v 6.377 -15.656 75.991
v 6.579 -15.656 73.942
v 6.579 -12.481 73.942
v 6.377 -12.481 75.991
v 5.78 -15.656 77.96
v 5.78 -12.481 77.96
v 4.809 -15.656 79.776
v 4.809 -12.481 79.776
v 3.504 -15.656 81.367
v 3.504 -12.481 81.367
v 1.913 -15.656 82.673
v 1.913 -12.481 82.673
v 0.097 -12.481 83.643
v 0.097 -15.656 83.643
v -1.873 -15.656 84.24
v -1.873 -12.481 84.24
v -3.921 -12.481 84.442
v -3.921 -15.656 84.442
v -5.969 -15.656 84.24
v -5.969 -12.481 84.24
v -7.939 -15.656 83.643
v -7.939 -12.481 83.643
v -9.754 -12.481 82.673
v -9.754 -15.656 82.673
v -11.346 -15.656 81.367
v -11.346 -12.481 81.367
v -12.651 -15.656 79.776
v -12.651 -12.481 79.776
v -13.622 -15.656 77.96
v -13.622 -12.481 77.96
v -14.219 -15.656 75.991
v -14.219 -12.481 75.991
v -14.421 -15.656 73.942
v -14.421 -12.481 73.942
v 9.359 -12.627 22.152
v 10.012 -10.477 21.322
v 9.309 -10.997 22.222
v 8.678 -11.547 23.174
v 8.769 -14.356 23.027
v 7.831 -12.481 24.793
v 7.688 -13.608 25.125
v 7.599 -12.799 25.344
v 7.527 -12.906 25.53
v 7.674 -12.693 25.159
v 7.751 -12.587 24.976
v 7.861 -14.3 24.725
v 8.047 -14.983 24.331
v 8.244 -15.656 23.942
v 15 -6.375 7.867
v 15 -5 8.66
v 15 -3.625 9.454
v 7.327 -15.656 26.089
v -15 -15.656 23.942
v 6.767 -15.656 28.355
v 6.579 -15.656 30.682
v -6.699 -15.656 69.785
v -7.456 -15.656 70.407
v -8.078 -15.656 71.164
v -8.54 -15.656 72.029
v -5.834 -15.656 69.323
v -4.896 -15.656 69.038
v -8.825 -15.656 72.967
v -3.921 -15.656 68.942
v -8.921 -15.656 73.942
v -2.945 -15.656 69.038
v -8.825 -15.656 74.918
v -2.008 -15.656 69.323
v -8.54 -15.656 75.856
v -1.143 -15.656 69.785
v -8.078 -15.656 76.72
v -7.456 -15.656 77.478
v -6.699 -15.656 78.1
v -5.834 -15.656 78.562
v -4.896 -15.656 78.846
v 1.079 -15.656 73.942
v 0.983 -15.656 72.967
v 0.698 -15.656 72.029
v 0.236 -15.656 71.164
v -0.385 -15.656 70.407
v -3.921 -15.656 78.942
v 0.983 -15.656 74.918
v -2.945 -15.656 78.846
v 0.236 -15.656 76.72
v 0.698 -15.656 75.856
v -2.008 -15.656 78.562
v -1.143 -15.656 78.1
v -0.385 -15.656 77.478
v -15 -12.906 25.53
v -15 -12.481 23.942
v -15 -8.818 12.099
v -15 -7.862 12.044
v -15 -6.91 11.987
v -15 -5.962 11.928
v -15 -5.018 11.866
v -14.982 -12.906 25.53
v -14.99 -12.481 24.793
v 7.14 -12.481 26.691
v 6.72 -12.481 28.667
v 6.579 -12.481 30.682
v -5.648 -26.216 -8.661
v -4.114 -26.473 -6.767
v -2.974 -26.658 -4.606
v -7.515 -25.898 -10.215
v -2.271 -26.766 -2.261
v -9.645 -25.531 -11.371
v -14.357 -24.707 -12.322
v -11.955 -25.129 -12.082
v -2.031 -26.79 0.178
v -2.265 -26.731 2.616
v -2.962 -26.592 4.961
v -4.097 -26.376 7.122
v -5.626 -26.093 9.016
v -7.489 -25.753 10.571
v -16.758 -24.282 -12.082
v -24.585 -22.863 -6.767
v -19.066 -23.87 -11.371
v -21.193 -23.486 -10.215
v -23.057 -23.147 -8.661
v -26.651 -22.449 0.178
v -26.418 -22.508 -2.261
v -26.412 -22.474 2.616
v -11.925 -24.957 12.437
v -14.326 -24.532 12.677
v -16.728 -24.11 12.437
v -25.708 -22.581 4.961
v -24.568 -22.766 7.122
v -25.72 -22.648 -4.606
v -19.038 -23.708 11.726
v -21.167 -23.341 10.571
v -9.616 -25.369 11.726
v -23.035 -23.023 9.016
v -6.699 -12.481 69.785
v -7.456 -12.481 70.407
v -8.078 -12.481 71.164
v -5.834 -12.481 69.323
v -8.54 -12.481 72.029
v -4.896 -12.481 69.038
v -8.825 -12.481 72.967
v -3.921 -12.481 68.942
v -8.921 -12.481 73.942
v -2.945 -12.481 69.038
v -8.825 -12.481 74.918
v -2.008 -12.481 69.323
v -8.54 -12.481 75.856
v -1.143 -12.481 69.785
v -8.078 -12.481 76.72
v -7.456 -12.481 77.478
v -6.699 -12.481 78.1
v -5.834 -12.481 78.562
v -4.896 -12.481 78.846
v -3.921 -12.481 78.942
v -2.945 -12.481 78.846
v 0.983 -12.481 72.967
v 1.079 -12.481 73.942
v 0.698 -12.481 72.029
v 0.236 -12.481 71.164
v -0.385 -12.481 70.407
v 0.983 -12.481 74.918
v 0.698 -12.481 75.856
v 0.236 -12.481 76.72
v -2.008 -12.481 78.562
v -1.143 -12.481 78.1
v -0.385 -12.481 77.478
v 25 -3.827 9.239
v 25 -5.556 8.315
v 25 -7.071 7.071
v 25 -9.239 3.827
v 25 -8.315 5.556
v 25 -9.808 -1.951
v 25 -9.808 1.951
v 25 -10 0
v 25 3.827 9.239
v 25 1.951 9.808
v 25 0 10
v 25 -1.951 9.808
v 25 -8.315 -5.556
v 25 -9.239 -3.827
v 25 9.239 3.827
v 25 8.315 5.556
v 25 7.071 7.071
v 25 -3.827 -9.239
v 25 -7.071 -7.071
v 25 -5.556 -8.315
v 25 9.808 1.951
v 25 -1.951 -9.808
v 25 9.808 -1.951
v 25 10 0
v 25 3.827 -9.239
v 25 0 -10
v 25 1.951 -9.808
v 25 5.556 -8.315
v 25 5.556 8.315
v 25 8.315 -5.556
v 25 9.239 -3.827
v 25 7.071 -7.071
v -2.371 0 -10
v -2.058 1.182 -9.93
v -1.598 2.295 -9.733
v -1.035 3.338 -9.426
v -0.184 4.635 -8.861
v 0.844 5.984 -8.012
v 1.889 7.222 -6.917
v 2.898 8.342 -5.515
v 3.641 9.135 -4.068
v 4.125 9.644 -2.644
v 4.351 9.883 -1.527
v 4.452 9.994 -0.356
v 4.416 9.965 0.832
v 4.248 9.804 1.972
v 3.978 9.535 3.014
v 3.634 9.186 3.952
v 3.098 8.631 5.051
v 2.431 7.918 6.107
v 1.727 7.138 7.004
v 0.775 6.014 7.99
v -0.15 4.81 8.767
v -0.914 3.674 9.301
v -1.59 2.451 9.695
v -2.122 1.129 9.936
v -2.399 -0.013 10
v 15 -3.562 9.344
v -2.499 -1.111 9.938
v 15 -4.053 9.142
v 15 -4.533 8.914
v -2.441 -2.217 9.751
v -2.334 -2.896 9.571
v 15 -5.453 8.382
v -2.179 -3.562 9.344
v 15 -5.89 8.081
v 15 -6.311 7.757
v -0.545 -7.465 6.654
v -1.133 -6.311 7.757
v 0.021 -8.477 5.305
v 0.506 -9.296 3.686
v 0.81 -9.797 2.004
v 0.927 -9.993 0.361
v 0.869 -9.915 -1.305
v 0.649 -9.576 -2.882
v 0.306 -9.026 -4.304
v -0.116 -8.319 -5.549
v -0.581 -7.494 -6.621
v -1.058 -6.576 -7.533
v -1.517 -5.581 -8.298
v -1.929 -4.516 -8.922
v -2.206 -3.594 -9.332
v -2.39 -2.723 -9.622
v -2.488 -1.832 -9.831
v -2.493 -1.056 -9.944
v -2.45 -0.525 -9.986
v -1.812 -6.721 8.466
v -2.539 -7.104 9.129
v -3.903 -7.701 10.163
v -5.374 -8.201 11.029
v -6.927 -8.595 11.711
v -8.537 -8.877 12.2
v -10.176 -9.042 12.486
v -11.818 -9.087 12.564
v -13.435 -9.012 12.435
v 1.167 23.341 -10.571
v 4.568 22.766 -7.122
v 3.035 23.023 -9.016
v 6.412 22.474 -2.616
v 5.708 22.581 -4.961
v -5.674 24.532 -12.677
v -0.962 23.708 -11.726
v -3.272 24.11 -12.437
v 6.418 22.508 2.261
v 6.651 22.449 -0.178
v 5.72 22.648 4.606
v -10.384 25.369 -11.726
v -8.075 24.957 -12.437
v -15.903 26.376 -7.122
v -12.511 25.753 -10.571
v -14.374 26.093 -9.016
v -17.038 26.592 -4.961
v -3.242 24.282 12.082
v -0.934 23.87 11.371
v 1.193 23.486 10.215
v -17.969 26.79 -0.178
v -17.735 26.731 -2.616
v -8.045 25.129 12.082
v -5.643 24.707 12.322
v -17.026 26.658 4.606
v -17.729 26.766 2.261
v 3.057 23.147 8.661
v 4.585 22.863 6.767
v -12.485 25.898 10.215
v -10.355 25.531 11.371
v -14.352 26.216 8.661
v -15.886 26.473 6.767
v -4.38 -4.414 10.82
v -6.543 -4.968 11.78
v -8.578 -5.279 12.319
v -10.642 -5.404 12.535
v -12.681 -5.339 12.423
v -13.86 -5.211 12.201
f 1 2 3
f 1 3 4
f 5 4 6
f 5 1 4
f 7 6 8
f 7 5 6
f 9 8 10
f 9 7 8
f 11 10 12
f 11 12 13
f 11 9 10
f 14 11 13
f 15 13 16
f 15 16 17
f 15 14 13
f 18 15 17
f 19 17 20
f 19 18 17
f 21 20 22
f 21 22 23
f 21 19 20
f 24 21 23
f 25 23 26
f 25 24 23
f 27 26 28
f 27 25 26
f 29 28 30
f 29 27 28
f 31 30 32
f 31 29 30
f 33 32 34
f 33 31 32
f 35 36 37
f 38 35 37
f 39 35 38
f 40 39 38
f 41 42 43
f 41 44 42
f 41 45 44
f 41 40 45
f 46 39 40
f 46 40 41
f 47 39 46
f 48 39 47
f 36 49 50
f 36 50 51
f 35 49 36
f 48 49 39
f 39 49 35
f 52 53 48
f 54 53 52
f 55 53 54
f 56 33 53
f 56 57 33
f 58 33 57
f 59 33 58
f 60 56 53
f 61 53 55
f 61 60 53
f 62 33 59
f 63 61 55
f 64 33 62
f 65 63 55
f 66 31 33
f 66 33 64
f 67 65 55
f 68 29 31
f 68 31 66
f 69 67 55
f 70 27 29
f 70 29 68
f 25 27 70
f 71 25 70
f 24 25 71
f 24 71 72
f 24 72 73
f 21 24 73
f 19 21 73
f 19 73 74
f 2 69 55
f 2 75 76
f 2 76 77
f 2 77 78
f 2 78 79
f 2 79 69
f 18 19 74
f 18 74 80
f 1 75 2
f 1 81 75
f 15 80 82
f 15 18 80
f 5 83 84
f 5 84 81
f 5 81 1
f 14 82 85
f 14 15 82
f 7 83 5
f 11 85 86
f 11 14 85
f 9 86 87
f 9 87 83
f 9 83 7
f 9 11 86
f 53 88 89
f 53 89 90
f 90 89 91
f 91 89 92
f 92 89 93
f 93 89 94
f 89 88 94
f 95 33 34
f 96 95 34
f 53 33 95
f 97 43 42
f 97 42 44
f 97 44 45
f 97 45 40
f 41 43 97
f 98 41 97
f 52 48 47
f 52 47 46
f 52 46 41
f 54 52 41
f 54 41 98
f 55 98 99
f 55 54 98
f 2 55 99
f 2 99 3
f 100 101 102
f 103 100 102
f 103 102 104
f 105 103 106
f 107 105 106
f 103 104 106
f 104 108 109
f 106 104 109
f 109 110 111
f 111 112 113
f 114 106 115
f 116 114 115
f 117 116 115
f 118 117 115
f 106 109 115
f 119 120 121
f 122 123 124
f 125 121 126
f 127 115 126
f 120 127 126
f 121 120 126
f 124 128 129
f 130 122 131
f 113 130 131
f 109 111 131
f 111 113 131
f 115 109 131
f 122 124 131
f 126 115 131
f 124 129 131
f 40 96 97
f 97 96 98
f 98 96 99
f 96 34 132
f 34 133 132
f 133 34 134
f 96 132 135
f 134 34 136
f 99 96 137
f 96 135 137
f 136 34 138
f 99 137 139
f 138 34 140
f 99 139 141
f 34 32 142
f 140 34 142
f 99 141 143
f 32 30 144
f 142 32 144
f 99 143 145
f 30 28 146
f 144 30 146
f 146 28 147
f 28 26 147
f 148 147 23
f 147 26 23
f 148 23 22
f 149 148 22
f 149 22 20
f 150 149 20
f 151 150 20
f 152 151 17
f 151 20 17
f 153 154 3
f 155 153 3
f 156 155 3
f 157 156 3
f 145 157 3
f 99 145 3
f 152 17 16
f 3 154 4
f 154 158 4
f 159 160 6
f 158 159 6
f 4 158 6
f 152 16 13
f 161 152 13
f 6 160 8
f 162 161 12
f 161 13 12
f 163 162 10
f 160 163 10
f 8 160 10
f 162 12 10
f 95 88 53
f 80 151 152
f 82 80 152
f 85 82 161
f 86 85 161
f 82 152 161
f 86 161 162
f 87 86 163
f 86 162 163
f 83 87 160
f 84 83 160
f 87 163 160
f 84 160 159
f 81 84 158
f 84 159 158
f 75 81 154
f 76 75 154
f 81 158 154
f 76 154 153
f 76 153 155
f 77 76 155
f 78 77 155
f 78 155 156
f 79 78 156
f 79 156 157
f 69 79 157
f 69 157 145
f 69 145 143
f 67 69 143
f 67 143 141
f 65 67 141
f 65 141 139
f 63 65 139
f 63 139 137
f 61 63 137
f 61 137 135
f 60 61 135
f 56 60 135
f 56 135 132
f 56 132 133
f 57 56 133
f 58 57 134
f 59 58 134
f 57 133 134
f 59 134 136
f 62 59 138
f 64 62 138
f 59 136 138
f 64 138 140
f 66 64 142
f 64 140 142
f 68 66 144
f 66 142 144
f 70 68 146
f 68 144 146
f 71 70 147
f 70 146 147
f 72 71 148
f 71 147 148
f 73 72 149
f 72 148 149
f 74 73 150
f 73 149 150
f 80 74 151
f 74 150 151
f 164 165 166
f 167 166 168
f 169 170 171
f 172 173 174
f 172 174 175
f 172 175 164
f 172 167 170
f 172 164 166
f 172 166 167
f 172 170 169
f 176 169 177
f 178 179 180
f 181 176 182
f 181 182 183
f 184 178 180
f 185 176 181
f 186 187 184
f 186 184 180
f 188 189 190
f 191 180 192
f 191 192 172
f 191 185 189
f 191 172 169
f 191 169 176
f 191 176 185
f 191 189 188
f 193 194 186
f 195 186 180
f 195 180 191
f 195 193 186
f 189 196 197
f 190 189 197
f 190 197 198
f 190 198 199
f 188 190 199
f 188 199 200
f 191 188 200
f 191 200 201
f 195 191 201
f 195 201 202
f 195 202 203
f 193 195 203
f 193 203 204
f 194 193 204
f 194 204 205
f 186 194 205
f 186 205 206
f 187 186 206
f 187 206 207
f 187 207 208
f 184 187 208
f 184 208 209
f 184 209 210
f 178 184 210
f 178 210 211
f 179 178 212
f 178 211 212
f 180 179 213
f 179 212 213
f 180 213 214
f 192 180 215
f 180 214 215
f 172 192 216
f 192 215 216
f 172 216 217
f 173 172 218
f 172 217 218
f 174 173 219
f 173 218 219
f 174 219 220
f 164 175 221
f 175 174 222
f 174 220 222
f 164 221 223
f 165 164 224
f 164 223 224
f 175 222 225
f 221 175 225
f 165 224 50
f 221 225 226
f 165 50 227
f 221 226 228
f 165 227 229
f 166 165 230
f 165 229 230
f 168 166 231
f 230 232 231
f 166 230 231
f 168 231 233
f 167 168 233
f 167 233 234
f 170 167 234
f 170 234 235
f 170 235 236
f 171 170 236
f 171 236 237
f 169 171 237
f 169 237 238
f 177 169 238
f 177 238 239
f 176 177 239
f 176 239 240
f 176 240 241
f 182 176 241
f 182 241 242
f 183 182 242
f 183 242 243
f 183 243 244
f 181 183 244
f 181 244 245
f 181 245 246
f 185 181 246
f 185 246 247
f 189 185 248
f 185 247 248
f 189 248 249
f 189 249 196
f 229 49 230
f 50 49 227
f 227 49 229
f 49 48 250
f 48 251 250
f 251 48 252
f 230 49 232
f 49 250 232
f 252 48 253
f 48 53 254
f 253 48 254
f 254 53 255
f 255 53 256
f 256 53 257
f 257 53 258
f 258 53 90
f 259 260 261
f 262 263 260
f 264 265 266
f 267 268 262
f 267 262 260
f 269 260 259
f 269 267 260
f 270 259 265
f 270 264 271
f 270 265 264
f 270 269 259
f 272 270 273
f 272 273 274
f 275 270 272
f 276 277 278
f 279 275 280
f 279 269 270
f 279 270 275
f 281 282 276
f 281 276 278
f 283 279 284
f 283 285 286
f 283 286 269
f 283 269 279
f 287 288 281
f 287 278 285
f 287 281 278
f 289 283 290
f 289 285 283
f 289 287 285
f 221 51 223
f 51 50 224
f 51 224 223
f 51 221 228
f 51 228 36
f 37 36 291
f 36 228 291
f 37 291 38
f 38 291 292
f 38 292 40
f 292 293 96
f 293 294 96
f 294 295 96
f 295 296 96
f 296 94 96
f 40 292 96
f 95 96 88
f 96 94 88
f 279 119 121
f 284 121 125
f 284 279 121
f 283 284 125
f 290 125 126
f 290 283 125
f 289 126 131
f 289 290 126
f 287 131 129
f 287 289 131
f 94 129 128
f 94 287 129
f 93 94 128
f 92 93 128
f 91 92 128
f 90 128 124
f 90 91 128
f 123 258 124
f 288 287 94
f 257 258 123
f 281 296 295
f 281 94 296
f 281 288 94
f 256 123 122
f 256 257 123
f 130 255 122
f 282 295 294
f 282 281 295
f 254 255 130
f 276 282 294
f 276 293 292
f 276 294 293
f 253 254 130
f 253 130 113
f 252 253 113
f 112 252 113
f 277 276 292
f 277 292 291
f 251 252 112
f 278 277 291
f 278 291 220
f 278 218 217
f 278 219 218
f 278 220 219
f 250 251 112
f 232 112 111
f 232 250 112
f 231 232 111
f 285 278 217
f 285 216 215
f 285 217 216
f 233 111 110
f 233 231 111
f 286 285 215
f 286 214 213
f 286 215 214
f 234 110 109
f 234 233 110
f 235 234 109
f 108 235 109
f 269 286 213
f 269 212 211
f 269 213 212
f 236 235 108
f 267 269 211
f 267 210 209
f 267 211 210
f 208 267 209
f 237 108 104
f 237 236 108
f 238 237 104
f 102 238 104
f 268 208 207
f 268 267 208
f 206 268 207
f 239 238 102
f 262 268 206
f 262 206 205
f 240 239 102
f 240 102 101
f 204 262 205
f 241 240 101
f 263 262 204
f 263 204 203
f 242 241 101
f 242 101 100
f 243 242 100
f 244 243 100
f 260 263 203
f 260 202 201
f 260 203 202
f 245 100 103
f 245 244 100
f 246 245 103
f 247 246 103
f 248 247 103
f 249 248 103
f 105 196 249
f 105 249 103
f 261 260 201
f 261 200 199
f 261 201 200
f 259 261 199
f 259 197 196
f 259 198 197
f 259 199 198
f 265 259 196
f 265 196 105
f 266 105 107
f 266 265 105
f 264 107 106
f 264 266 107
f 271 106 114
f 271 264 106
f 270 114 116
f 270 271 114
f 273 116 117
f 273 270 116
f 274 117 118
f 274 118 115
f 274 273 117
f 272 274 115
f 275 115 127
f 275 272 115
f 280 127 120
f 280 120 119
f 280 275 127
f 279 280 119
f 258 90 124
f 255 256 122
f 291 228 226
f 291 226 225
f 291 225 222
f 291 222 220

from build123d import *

# Parameters (mm, degrees)
BOSS_EXTRUDE1_DEPTH      = 25
BOSS_EXTRUDE1_DEPTH_BACK = 10
SKETCH1_R                = 10
SKETCH2_R                = 12.5
BOSS_EXTRUDE2_DEPTH      = 25
BOSS_EXTRUDE3_DEPTH      = 15
BOSS_EXTRUDE3_DEPTH_BACK = 15
CUT_EXTRUDE1_DEPTH       = 10
BOSS_EXTRUDE4_DEPTH      = 3.175
CUT_EXTRUDE2_DEPTH       = 10
SKETCH11_R               = 5
CUT_EXTRUDE6_DEPTH       = 10


with BuildPart() as part:
    # Sketch1 → Boss-Extrude1 (new, two sides: drawn at the far end of the back side and taken through both)
    with BuildSketch(Plane(origin=(0, 0, 0), x_dir=(0, 0, -1), z_dir=(1, 0, 0)).offset(-BOSS_EXTRUDE1_DEPTH_BACK)):
        Circle(SKETCH1_R)
    extrude(amount=BOSS_EXTRUDE1_DEPTH + BOSS_EXTRUDE1_DEPTH_BACK)

    # Sketch2 → Boss-Extrude2 (add, symmetric)
    with BuildSketch(Plane(origin=(-10, 0, 0), x_dir=(0.9848069802426886, -0.173652560203633, 1.5808464272800858e-08), z_dir=(0.17364817766692736, 0.9847821256419462, -0.007104604780387524))):
        Circle(SKETCH2_R)
    extrude(amount=BOSS_EXTRUDE2_DEPTH, both=True)

    # Sketch5 → Boss-Extrude3 (add, two sides: drawn at the far end of the back side and taken through both)
    with BuildSketch(Plane(origin=(0, 0, 0), x_dir=(0, 0, -1), z_dir=(1, 0, 0)).offset(-BOSS_EXTRUDE3_DEPTH_BACK)):
        Polygon((0.79375, -1.374815329), (-0.79375, 1.374815329), (-25.529710951, -12.906498385), (-23.942210951, -15.656129042), align=None)
    extrude(amount=BOSS_EXTRUDE3_DEPTH + BOSS_EXTRUDE3_DEPTH_BACK)

    # Sketch6 → Cut-Extrude1 (cut)
    with BuildSketch(Plane(origin=(0, -1.374815329, -0.79375), x_dir=(1, 0, 0), z_dir=(0, -0.8660254037844415, -0.4999999999999954))):
        Polygon((15, 28.562627427), (15, 10), (8.243756147, 28.562627427), align=None)
    extrude(amount=-CUT_EXTRUDE1_DEPTH, mode=Mode.SUBTRACT)

    # Sketch7 → Boss-Extrude4 (add)
    with BuildSketch(Plane.XZ.offset(15.656129042)):
        with BuildLine():
            Line((-14.420950658, 73.942210951), (-15, 23.942210951))
            Line((-15, 23.942210951), (8.243756147, 23.942210951))
            ThreePointArc((8.243756147, 23.942210951), (7.001386396, 27.211000098), (6.579049342, 30.68232499))
            Line((6.579049342, 30.68232499), (6.579049342, 73.942210951))
            ThreePointArc((6.579049342, 73.942210951), (-3.920950658, 84.442210951), (-14.420950658, 73.942210951))
        make_face()
    extrude(amount=-BOSS_EXTRUDE4_DEPTH)

    # Sketch9 → Cut-Extrude2 (cut)
    with BuildSketch(Plane.XZ.offset(15.656129042)):
        with BuildLine():
            Line((17.296769939, 44.662823633), (24.815608182, 16.701826347))
            ThreePointArc((24.815608182, 16.701826347), (7.075690418, 26.922905868), (17.296769939, 44.662823633))
        make_face()
    extrude(amount=-CUT_EXTRUDE2_DEPTH, mode=Mode.SUBTRACT)

    # Sketch11 → Cut-Extrude6 (cut)
    with BuildSketch(Plane(origin=(0, -12.481129042, 0), x_dir=(1, 0, 0), z_dir=(0, 1, 0))):
        with Locations((-3.920950658, -73.942210951)):
            Circle(SKETCH11_R)
    extrude(amount=-CUT_EXTRUDE6_DEPTH, mode=Mode.SUBTRACT)


solid = part.part
